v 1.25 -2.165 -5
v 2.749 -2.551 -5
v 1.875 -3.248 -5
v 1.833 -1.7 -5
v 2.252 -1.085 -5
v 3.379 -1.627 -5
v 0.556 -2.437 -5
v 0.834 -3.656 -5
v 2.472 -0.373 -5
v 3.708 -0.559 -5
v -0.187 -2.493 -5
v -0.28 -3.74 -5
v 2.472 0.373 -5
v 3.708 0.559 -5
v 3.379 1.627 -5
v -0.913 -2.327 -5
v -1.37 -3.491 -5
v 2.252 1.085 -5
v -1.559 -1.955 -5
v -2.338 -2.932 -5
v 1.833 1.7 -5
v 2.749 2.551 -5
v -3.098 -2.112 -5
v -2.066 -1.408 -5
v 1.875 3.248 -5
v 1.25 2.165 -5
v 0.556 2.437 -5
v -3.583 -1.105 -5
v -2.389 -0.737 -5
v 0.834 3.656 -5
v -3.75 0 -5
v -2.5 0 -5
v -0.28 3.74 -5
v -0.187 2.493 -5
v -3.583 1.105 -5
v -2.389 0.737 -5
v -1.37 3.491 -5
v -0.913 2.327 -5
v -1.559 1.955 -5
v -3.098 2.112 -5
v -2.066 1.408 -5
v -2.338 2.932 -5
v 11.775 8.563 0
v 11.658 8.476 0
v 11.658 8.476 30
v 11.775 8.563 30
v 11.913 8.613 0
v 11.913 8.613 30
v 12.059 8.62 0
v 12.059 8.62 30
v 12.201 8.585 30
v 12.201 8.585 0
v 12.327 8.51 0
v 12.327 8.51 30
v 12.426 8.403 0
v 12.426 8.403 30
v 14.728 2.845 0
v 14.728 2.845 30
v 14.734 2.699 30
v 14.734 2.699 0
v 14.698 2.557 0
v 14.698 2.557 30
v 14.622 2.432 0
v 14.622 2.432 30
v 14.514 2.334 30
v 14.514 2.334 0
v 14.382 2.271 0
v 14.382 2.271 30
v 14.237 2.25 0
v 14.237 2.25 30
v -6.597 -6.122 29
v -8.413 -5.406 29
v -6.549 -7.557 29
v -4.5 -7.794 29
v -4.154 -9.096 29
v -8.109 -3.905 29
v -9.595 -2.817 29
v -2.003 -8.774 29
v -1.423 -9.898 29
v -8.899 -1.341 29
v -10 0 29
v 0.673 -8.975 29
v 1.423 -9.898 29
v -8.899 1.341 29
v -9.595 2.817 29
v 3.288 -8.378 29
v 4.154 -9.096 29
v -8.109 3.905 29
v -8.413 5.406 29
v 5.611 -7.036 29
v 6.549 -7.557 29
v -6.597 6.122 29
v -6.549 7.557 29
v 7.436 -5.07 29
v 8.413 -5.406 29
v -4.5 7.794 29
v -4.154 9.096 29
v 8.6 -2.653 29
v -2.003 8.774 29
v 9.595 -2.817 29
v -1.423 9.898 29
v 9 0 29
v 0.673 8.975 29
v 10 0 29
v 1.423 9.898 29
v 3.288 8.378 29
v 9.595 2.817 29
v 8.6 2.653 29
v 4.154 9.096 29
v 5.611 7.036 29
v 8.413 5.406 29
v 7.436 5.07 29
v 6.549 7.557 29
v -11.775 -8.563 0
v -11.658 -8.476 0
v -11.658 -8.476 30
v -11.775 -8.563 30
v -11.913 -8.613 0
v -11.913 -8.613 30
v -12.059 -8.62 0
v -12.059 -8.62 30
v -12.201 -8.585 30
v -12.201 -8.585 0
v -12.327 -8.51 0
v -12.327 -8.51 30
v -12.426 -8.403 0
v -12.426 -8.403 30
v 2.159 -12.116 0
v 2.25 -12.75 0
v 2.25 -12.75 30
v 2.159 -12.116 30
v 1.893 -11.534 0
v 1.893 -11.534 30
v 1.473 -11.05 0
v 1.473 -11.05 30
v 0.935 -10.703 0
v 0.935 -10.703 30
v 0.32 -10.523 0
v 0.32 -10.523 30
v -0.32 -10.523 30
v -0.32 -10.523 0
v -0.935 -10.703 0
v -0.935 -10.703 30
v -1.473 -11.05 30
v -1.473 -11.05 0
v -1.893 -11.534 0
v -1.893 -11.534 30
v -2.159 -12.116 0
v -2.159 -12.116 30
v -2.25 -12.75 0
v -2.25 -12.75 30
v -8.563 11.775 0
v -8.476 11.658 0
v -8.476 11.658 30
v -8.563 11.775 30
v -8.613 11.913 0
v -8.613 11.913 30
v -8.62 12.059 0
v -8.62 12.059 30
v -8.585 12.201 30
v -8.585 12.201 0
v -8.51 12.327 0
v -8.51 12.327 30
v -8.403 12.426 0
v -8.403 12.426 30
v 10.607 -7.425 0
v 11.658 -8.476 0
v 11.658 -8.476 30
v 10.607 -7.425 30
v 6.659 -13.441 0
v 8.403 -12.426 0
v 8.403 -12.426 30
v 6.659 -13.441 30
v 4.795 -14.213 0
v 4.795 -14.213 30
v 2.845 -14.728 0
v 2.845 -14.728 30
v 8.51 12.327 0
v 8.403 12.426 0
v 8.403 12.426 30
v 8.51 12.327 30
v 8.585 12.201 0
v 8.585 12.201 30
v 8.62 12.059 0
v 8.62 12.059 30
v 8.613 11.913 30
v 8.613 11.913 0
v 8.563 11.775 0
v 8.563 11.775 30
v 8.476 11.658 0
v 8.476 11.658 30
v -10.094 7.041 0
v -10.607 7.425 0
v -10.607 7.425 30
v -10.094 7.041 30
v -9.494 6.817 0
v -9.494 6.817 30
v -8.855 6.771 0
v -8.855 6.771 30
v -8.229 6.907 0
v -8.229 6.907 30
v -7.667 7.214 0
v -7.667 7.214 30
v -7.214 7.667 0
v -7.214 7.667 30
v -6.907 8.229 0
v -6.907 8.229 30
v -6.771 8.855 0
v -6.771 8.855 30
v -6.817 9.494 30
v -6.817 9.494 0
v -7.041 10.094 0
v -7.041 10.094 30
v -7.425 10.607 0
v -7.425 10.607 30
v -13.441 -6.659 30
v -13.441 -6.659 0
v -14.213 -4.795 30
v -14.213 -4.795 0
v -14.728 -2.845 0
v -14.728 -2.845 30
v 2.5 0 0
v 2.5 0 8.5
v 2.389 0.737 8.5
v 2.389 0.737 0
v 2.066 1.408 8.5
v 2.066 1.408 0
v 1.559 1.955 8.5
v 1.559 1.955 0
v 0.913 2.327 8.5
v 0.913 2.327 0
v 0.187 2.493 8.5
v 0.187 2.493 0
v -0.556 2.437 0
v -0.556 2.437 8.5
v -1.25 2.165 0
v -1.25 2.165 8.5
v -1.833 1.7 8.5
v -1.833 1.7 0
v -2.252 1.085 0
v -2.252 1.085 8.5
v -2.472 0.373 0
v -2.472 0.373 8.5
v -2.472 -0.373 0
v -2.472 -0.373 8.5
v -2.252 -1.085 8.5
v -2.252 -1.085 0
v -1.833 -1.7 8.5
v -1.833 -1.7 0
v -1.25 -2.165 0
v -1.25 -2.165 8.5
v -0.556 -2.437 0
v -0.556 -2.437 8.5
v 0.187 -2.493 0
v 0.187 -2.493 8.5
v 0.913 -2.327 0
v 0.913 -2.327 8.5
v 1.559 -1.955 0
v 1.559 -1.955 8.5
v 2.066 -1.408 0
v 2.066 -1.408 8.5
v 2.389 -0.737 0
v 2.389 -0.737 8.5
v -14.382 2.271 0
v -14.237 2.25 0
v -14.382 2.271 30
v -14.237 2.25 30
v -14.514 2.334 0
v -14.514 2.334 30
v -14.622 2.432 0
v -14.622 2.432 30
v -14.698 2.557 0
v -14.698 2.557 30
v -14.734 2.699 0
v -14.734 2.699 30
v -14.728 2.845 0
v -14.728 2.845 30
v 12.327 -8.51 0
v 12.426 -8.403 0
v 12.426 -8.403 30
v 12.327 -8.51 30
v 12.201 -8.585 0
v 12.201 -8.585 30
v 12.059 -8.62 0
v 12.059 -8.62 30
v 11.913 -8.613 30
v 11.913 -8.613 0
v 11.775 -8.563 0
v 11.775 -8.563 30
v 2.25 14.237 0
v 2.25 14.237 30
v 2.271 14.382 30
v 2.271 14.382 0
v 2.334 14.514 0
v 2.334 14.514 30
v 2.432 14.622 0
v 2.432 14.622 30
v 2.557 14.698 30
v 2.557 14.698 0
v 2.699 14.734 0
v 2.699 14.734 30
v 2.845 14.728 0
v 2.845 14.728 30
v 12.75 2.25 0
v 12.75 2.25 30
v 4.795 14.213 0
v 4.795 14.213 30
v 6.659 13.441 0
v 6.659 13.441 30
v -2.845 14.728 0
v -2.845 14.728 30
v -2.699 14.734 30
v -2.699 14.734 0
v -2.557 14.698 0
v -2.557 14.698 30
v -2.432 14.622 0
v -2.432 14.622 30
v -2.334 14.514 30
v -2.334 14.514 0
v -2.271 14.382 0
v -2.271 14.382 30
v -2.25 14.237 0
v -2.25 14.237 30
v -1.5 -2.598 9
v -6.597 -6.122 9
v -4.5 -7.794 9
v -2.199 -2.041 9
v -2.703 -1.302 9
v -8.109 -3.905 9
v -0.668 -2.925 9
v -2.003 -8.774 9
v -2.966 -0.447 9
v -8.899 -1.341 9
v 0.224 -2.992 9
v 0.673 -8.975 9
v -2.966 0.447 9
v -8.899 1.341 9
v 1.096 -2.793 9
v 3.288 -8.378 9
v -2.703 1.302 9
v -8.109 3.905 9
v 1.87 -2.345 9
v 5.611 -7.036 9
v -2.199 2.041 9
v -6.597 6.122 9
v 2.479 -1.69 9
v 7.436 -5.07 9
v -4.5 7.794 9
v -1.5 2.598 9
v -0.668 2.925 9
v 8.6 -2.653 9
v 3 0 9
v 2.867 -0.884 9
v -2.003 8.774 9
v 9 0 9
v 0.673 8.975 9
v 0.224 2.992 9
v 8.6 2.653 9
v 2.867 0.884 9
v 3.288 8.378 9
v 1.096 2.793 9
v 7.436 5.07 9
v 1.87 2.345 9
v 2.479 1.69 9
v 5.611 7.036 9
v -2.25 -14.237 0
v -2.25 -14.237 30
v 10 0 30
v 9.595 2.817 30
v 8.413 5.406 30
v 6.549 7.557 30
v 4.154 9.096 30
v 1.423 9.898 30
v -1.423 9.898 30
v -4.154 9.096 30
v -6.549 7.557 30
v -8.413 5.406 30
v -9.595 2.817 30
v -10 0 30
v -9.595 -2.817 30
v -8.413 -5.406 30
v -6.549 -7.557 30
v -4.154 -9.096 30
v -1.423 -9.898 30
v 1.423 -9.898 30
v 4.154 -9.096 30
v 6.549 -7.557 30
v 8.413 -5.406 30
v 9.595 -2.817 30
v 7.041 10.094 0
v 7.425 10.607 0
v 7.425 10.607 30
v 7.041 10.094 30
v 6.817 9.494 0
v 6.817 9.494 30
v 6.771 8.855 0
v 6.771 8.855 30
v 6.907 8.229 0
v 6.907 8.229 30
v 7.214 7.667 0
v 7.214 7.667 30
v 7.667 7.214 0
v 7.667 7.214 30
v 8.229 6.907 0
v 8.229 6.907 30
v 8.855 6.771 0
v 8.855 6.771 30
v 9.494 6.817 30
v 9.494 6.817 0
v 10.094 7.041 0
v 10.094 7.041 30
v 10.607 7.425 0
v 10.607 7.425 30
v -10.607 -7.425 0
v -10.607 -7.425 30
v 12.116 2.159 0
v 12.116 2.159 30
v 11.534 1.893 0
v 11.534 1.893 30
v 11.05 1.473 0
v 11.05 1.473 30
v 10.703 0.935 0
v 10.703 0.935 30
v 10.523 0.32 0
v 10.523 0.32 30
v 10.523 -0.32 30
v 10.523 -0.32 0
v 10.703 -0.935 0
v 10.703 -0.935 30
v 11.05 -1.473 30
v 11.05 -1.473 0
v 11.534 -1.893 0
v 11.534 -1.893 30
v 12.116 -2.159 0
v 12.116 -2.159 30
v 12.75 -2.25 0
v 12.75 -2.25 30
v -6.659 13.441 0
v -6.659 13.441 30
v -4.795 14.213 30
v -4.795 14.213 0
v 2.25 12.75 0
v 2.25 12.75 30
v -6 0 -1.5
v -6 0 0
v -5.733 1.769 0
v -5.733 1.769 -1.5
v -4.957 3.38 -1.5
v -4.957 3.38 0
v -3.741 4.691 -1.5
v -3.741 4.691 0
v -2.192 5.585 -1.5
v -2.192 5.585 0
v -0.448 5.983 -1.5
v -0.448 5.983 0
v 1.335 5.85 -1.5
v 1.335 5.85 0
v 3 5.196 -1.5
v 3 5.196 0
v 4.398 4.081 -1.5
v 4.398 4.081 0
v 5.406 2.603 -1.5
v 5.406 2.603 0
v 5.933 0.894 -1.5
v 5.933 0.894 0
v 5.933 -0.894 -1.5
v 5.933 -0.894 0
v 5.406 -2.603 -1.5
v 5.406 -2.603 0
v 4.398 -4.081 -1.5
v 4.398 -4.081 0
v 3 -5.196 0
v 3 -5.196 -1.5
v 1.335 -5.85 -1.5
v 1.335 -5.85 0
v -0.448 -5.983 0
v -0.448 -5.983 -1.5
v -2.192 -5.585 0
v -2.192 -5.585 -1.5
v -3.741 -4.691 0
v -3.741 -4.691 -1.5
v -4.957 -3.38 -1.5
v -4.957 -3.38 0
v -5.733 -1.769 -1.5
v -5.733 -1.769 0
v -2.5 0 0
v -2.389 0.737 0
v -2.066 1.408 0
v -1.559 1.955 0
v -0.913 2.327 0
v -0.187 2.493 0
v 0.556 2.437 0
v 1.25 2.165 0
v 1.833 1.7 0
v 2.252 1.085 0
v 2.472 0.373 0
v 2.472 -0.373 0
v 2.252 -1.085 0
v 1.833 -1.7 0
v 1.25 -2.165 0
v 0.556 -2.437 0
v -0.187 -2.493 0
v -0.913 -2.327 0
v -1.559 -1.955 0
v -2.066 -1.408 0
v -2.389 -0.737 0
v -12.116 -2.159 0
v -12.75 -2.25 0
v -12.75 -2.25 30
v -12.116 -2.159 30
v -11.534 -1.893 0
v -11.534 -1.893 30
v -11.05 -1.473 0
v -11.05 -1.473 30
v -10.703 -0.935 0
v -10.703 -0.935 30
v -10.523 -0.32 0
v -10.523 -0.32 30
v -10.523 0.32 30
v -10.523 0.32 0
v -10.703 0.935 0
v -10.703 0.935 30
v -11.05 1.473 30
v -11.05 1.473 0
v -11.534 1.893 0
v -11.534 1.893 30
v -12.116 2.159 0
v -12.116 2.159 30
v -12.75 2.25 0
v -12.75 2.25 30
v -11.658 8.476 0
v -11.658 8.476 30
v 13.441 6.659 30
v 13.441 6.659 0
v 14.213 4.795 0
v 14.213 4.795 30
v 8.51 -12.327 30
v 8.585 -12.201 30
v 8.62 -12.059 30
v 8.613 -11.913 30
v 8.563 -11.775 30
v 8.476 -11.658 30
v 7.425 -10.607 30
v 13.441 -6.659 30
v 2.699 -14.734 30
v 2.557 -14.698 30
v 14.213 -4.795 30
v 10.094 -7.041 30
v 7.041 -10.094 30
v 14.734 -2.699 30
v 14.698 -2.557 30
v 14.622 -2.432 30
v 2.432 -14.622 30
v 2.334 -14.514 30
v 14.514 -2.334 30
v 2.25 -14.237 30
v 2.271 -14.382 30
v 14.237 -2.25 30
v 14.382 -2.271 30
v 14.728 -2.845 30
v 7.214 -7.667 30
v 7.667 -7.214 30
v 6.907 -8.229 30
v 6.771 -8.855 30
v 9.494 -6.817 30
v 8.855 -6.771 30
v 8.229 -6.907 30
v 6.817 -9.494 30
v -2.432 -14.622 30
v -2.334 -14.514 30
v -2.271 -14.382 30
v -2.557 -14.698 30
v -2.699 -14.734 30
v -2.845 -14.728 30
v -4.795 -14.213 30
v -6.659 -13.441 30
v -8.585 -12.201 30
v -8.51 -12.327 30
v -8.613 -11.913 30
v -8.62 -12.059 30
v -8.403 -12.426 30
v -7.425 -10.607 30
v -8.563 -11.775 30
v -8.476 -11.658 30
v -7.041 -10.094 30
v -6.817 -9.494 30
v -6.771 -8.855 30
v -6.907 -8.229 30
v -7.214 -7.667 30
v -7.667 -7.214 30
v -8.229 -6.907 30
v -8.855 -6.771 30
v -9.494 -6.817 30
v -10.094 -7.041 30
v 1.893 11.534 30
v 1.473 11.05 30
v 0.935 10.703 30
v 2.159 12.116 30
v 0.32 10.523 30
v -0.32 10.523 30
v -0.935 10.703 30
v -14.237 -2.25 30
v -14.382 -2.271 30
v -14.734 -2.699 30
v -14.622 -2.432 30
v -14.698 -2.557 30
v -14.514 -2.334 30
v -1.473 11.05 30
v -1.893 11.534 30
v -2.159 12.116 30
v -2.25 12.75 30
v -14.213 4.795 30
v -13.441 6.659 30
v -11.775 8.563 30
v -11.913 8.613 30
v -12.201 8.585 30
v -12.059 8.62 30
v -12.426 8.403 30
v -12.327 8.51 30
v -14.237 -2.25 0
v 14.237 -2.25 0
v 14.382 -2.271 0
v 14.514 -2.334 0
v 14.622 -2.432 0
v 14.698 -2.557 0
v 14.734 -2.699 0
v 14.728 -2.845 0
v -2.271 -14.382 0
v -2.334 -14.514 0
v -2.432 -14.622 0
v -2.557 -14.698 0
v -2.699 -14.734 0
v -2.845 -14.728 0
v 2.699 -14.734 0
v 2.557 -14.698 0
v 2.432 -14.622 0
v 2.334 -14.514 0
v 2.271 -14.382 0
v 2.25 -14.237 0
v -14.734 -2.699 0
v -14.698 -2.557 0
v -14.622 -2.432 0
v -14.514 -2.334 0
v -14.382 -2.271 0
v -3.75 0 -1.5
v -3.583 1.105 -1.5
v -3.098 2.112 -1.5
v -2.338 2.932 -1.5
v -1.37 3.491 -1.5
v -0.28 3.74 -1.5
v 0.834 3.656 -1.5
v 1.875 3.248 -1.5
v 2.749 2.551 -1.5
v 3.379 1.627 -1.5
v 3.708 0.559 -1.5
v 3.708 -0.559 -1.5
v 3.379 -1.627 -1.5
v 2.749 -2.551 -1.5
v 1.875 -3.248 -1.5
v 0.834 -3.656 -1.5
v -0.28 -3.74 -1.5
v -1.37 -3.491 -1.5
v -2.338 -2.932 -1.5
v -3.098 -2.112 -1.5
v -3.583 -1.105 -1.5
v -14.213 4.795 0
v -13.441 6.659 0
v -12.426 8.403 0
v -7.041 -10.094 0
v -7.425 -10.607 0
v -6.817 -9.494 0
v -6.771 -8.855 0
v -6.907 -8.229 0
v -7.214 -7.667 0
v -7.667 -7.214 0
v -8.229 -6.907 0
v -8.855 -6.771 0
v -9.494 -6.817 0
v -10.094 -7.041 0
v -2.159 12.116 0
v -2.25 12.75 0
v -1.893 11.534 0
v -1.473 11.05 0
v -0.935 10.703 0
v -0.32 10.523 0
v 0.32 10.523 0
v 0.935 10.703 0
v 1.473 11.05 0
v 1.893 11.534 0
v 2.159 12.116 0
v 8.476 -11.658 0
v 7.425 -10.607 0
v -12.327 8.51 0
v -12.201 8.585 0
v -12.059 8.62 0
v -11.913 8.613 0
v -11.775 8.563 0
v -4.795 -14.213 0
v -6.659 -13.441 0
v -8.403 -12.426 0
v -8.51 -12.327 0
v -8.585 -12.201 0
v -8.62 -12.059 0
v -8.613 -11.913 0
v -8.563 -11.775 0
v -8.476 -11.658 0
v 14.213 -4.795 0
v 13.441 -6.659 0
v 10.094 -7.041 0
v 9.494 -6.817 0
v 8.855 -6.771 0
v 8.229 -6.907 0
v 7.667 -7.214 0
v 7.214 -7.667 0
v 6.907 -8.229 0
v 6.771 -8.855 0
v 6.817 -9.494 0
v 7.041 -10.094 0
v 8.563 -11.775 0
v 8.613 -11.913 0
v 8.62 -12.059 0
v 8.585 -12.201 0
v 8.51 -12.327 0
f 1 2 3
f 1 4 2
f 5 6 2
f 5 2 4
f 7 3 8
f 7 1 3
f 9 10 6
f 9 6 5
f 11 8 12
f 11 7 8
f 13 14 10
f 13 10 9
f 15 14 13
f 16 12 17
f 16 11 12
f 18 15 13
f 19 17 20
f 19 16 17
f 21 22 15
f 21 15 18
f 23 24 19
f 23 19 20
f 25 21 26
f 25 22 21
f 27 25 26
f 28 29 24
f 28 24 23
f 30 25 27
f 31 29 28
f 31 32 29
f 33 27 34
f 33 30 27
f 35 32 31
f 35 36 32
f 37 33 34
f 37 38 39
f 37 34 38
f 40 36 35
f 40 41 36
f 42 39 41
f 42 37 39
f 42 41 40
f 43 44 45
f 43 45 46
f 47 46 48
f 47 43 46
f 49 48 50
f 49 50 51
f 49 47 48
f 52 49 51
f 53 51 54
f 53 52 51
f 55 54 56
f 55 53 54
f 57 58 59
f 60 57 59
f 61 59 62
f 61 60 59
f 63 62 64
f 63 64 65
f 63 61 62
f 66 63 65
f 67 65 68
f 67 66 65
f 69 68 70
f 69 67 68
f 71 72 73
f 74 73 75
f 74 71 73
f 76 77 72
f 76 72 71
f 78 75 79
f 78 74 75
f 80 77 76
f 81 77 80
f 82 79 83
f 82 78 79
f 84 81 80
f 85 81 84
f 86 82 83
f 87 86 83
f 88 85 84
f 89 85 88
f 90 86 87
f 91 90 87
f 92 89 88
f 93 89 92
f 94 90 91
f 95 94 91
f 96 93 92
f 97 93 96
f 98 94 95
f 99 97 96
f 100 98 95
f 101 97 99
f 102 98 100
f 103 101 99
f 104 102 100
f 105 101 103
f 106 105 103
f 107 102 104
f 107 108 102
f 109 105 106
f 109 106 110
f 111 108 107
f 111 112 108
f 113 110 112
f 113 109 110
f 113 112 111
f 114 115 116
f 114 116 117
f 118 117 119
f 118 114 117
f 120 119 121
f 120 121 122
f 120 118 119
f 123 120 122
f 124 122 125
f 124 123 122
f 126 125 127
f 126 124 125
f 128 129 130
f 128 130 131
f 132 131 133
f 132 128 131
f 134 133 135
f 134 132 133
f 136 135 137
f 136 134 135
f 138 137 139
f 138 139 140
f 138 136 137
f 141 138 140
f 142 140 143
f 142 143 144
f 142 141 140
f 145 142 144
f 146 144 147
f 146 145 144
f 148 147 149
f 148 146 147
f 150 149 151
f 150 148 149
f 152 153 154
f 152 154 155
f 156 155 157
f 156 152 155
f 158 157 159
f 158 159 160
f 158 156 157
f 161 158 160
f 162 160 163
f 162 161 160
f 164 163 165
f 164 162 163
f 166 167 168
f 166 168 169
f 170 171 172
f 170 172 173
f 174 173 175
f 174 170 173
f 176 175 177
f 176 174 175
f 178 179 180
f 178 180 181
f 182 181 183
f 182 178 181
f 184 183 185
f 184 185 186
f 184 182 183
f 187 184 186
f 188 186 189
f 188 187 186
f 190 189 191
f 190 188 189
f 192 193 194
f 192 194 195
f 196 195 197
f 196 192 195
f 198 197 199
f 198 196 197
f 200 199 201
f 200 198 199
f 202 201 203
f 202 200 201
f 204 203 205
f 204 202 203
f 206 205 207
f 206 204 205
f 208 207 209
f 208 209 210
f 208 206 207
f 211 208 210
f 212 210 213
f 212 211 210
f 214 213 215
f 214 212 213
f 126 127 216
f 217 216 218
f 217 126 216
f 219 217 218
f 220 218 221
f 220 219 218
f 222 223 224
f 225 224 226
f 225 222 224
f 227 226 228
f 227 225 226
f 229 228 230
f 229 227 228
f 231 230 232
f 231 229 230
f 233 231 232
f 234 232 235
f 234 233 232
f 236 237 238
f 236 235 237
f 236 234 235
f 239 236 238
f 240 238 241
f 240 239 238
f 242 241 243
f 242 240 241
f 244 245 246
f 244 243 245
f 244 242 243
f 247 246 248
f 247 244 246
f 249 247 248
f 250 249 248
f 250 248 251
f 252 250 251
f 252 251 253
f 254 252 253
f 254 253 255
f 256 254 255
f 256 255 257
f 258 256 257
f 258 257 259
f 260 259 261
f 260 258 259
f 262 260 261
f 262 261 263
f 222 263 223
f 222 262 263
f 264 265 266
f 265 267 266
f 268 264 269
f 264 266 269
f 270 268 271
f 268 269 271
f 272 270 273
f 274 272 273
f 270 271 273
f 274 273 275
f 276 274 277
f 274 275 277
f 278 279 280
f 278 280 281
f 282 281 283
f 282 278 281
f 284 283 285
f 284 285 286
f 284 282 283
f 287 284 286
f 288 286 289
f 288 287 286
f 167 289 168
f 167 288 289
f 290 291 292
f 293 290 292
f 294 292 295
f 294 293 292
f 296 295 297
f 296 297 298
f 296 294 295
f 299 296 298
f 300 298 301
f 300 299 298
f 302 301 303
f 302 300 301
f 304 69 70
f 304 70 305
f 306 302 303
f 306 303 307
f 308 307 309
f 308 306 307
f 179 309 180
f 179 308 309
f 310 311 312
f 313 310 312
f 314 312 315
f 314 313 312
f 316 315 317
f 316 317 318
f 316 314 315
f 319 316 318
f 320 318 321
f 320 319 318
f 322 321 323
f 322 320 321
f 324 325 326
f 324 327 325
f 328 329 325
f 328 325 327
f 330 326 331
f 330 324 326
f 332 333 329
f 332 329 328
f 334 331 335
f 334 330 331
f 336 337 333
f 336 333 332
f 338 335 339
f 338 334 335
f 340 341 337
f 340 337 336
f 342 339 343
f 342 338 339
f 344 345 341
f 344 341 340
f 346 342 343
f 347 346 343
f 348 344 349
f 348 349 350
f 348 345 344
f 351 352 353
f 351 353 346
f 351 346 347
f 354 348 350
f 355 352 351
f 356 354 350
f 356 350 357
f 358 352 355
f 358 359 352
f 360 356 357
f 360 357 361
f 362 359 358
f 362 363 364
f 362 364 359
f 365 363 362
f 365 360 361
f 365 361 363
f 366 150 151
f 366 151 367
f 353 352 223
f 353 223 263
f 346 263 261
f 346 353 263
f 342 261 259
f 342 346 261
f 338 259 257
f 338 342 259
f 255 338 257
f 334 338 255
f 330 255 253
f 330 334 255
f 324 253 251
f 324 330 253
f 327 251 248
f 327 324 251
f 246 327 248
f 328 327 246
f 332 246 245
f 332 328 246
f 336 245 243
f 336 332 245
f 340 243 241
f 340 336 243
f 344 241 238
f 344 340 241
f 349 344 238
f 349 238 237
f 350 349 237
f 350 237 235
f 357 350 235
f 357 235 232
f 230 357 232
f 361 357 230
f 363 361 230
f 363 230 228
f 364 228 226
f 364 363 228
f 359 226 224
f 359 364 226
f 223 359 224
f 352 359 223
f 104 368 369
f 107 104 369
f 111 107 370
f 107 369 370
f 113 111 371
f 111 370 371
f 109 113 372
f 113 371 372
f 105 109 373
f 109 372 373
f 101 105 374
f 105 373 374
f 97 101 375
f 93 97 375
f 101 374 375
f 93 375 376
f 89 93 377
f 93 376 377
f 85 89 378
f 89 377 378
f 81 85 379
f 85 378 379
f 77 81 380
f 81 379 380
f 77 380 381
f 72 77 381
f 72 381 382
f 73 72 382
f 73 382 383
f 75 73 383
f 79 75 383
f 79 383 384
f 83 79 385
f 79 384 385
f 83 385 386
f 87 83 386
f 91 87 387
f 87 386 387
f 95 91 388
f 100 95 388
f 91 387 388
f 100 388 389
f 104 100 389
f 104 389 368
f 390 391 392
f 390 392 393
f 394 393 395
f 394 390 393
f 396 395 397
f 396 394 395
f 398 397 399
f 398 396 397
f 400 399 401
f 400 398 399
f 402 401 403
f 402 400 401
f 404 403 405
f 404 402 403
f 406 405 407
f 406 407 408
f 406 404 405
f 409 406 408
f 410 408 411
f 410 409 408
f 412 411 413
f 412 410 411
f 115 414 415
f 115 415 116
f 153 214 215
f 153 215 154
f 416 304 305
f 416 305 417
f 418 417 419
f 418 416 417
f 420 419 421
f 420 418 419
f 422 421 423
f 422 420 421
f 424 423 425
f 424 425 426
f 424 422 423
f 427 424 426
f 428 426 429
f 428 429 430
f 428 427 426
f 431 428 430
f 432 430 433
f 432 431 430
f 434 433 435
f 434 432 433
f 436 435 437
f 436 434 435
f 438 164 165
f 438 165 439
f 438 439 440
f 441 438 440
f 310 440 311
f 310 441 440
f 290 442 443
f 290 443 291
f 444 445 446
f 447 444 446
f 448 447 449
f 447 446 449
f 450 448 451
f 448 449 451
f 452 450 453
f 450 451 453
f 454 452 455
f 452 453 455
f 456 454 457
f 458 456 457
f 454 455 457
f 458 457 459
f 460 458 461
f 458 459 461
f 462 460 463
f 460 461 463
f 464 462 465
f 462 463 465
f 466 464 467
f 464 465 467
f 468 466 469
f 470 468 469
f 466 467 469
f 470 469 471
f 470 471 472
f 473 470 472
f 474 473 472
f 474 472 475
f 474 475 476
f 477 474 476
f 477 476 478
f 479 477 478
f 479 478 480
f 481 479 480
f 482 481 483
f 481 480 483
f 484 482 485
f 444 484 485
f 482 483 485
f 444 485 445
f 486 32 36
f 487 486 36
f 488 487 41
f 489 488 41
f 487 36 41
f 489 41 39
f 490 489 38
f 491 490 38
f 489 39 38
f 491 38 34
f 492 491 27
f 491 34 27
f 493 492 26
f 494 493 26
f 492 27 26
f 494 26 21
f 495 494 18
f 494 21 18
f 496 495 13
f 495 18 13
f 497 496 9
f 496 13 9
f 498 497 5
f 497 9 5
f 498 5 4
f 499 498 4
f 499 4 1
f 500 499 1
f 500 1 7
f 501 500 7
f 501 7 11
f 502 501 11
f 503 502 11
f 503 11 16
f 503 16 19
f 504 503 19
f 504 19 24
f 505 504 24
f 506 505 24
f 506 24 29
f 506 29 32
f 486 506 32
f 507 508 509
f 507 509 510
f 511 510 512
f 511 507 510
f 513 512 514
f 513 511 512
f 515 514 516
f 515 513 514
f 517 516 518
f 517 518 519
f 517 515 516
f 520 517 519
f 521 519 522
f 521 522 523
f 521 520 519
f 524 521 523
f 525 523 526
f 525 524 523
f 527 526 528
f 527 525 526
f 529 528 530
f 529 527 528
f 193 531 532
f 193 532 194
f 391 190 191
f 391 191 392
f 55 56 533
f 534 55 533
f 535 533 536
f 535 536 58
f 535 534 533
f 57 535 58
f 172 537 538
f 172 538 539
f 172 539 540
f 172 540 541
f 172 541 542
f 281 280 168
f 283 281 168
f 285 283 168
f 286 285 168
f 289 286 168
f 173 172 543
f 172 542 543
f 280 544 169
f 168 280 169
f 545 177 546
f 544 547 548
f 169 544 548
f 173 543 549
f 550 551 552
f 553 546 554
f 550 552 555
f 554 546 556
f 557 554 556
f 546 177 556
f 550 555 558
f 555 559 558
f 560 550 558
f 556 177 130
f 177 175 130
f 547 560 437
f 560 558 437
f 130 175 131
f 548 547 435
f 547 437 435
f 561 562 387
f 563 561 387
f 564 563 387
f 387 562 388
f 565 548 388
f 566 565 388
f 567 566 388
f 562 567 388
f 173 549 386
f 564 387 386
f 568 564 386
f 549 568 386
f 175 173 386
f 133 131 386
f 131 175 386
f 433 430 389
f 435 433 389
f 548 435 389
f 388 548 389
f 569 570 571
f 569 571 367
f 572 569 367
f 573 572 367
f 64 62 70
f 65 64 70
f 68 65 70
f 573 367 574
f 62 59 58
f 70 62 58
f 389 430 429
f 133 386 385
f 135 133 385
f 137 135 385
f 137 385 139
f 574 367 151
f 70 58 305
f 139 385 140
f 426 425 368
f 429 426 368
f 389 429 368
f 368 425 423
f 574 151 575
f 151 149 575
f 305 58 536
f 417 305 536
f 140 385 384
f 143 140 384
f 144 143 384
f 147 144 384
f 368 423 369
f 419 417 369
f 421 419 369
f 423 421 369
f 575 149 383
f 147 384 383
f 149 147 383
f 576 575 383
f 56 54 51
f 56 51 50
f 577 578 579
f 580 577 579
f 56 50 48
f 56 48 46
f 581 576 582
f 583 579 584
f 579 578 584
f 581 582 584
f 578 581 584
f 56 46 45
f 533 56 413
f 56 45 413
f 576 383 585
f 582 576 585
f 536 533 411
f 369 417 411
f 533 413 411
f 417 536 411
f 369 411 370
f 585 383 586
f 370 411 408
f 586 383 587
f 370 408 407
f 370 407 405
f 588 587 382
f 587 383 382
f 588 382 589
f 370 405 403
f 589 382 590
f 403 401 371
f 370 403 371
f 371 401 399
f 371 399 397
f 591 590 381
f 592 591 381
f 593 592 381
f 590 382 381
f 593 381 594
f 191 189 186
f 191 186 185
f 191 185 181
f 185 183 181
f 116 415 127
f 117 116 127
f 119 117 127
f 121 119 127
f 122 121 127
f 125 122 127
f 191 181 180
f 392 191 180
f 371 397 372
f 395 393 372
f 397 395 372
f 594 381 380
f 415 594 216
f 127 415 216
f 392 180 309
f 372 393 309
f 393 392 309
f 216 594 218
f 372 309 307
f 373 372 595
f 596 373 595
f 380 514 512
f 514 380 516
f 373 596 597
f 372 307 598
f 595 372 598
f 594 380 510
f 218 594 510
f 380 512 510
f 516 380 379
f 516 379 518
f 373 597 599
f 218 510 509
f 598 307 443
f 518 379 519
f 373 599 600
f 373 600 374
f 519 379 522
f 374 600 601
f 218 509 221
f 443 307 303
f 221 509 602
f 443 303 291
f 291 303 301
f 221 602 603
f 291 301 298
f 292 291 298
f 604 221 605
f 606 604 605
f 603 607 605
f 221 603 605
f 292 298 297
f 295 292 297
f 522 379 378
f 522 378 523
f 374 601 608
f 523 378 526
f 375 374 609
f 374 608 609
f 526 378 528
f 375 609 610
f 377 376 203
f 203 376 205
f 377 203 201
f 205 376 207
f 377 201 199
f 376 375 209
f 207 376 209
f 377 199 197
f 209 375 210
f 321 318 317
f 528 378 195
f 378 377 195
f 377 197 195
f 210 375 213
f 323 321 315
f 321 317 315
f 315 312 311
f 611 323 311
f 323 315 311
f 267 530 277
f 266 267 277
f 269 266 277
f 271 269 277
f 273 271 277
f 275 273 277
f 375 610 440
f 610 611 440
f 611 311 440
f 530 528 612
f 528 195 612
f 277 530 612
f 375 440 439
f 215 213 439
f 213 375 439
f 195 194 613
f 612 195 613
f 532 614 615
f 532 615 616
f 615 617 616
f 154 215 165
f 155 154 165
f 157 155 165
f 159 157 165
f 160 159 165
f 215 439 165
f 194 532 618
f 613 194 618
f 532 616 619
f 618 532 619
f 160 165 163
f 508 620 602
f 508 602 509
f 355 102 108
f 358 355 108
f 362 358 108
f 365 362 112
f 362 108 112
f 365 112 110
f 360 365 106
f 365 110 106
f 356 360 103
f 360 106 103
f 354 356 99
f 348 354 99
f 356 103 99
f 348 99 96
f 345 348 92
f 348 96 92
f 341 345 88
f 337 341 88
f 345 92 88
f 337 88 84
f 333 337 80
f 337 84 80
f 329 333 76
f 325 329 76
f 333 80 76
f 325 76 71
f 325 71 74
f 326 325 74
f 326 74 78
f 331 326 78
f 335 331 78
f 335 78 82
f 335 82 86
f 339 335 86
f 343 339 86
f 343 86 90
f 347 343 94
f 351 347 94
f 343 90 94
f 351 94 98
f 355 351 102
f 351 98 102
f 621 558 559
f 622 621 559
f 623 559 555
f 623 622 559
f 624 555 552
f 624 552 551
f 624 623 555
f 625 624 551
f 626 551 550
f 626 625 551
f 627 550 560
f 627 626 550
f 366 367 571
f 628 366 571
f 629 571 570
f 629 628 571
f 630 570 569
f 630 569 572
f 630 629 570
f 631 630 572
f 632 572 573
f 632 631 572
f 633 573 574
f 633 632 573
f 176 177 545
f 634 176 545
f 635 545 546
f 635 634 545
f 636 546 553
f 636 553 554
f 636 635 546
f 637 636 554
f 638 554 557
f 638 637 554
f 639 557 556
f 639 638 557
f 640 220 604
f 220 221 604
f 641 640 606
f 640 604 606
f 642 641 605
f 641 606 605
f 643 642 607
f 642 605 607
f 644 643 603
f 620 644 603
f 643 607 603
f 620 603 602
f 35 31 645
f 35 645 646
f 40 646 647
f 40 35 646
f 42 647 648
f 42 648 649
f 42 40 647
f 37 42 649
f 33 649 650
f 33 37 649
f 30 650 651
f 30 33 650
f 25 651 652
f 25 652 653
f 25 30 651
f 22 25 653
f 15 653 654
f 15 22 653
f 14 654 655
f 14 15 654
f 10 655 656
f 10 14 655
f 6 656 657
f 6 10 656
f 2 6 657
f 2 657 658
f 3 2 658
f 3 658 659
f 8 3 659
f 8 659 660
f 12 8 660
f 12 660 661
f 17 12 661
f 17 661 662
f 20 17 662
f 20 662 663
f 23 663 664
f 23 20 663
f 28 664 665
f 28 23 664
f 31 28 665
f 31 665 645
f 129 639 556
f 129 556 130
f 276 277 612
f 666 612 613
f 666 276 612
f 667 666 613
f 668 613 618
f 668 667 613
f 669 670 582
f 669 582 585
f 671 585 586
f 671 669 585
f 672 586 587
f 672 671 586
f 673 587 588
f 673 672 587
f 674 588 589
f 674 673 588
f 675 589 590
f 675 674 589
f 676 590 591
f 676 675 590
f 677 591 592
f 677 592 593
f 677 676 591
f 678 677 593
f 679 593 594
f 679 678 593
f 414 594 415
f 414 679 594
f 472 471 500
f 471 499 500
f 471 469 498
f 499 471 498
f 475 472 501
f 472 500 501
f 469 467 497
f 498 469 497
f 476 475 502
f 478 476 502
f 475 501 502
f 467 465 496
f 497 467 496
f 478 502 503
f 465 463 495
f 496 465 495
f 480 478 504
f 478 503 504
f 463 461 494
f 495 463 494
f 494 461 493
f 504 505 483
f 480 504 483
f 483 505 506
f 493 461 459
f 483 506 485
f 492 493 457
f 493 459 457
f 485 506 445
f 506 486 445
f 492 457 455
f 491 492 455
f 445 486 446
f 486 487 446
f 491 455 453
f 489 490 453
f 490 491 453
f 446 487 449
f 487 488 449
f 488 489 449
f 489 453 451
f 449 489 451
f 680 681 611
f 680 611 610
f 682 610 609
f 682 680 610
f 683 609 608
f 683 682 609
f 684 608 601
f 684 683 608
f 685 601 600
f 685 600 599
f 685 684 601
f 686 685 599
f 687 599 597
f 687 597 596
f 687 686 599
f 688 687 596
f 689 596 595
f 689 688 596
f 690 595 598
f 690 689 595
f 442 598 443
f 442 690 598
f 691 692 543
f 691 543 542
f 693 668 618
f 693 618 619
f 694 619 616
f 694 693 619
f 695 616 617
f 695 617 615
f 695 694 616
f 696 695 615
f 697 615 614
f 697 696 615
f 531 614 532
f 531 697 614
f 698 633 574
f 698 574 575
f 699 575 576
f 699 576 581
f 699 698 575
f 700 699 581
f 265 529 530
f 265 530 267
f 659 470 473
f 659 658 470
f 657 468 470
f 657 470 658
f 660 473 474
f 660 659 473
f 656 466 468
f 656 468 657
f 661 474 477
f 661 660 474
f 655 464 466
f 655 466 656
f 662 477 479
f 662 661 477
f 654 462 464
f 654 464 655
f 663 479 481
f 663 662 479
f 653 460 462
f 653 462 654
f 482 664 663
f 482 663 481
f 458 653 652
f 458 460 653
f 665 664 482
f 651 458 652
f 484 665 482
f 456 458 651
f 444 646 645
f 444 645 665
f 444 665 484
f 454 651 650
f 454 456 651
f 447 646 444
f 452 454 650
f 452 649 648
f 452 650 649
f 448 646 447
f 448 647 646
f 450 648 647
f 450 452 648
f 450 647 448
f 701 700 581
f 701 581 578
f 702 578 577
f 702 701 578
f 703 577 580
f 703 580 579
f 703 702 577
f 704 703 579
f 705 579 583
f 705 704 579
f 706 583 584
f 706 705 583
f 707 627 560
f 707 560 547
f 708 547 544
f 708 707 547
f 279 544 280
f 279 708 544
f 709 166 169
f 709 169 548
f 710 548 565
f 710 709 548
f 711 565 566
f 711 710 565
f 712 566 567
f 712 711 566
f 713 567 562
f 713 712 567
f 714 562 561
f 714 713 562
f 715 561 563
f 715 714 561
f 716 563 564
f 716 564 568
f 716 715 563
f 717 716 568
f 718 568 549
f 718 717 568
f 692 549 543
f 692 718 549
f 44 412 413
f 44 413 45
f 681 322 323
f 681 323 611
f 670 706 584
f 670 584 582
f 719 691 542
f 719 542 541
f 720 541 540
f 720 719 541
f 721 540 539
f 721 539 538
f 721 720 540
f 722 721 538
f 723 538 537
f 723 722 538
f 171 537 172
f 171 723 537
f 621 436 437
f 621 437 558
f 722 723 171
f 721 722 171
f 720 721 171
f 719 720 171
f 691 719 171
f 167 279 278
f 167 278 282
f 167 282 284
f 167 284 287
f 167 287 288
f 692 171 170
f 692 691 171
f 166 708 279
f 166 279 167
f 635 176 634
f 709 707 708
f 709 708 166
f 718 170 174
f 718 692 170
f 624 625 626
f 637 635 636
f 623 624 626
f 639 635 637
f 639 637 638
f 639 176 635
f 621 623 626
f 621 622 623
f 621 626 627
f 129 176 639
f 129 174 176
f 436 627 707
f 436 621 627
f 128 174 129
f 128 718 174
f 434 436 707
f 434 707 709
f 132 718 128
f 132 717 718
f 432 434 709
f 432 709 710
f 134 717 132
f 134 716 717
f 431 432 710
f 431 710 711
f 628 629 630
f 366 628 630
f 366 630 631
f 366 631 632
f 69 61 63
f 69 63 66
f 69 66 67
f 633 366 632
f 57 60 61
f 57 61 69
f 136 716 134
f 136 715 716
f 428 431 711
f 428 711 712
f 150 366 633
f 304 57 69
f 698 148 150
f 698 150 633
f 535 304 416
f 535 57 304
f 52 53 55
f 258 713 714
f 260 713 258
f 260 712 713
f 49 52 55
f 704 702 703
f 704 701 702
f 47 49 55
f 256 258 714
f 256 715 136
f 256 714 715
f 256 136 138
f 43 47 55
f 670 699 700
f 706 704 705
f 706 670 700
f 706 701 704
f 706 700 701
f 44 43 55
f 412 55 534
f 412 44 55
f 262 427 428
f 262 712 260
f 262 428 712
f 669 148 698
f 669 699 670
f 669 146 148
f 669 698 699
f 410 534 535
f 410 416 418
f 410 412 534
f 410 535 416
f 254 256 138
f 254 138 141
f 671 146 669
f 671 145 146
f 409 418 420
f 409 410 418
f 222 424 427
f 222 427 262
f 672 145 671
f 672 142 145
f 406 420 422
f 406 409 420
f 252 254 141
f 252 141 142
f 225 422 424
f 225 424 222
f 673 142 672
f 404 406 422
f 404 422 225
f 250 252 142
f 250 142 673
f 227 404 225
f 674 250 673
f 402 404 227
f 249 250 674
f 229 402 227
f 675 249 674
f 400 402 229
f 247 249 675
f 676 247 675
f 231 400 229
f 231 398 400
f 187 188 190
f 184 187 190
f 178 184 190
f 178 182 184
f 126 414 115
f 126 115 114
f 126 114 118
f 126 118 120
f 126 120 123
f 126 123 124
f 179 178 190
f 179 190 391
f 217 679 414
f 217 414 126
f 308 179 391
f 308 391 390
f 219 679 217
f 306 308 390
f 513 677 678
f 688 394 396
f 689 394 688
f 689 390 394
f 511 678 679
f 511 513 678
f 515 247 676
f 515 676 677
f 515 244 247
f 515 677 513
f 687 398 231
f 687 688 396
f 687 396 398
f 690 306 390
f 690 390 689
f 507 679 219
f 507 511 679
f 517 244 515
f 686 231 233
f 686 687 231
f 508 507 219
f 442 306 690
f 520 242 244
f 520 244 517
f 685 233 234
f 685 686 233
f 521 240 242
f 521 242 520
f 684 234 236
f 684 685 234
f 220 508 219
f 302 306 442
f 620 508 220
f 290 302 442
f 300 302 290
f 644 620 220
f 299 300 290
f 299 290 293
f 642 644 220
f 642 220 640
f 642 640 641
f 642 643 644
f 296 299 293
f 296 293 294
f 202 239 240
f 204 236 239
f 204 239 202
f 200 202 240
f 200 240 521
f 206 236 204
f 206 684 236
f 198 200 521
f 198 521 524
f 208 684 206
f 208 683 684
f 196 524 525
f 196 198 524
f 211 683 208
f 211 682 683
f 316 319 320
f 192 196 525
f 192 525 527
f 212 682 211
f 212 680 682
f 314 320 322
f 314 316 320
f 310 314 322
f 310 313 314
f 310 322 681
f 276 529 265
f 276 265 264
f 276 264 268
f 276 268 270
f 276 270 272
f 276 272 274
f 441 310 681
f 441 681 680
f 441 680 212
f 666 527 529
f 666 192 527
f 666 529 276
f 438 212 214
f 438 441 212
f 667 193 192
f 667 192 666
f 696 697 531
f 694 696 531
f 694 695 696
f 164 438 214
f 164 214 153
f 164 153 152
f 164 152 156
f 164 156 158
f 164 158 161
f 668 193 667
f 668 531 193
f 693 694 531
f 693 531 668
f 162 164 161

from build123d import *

# Parameters (mm, degrees)
SKETCH_1_R               = 2.5
EXTRUDE_1_DEPTH          = 30
FILLET_1_R               = 0.5
SKETCH_3_R               = 10
CUT_EXTRUDE_1_DEPTH      = 1
SKETCH_4_R               = 9
CUT_EXTRUDE_2_DEPTH      = 20
CHAMFER_1_SIZE           = 0.5
PATTERN_CIRCULAR_3_DEPTH = 30
SKETCH_9_R               = 6
SKETCH_9_R_2             = 2.5
EXTRUDE_3_DEPTH          = 1.5
EXTRUDE_START            = 3.5
SKETCH_10_R              = 3.75
SKETCH_10_R_2            = 2.5
EXTRUDE_4_DEPTH          = 3.5


# Read off the part's stored shape, not the designer's step: 阵列(圆周)3
with BuildPart() as part:
    # 草图1 → 凸台-拉伸1 (new body)
    with BuildSketch(Plane.XY):
        with BuildLine():
            Line((-12.75, 2.25), (-14.83028995, 2.25))
            ThreePointArc((-14.83028995, 2.25), (15, 0), (-14.83028995, -2.25))
            Line((-14.83028995, -2.25), (-12.75, -2.25))
            ThreePointArc((-12.75, -2.25), (-10.5, 0), (-12.75, 2.25))
        make_face()
        Circle(SKETCH_1_R, mode=Mode.SUBTRACT)
    extrude(amount=EXTRUDE_1_DEPTH)

    # 圆角1
    fillet_1_edges = [part.edges().sort_by_distance(p)[0] for p in [
        (-14.83028995, 2.25, 15),
        (-14.83028995, -2.25, 15),
    ]]
    fillet(fillet_1_edges, radius=FILLET_1_R)

    # 草图3 → 切除-拉伸1 (cut)
    with BuildSketch(Plane.XY.offset(30)):
        Circle(SKETCH_3_R)
    extrude(amount=-CUT_EXTRUDE_1_DEPTH, mode=Mode.SUBTRACT)

    # 草图4 → 切除-拉伸2 (cut)
    with BuildSketch(Plane.XY.offset(29)):
        Circle(SKETCH_4_R)
    extrude(amount=-CUT_EXTRUDE_2_DEPTH, mode=Mode.SUBTRACT)

    # 倒角1
    chamfer_1_edges = [part.edges().sort_by_distance(p)[0] for p in [
        (-2.5, 0, 9),
    ]]
    chamfer(chamfer_1_edges, length=CHAMFER_1_SIZE)

    # 阵列(圆周)3 outline → 阵列(圆周)3 (cut)
    with BuildSketch(Plane.XY):
        with BuildLine():
            ThreePointArc((-12.425696839, -8.402503084), (-10.606601718, -10.606601718), (-8.402503084, -12.425696839))
            ThreePointArc((-8.402503084, -12.425696839), (-8.620145822, -12.059137344), (-8.475973038, -11.657953554))
            Line((-8.475973038, -11.657953554), (-7.424621202, -10.606601718))
            ThreePointArc((-7.424621202, -10.606601718), (-7.424621202, -7.424621202), (-10.606601718, -7.424621202))
            Line((-10.606601718, -7.424621202), (-11.657953554, -8.475973038))
            ThreePointArc((-11.657953554, -8.475973038), (-12.059137344, -8.620145822), (-12.425696839, -8.402503084))
        make_face()
        with BuildLine():
            ThreePointArc((-8.475973038, 11.657953554), (-8.620145822, 12.059137344), (-8.402503084, 12.425696839))
            ThreePointArc((-8.402503084, 12.425696839), (-10.606601718, 10.606601718), (-12.425696839, 8.402503084))
            ThreePointArc((-12.425696839, 8.402503084), (-12.059137344, 8.620145822), (-11.657953554, 8.475973038))
            Line((-11.657953554, 8.475973038), (-10.606601718, 7.424621202))
            ThreePointArc((-10.606601718, 7.424621202), (-7.424621202, 7.424621202), (-7.424621202, 10.606601718))
            Line((-7.424621202, 10.606601718), (-8.475973038, 11.657953554))
        make_face()
        with BuildLine():
            ThreePointArc((2.25, 14.236836025), (2.431734225, 14.622461357), (2.844827586, 14.727761405))
            ThreePointArc((2.844827586, 14.727761405), (0, 15), (-2.844827586, 14.727761405))
            ThreePointArc((-2.844827586, 14.727761405), (-2.431734225, 14.622461357), (-2.25, 14.236836025))
            Line((-2.25, 14.236836025), (-2.25, 12.75))
            ThreePointArc((-2.25, 12.75), (0, 10.5), (2.25, 12.75))
            Line((2.25, 12.75), (2.25, 14.236836025))
        make_face()
        with BuildLine():
            ThreePointArc((11.657953554, 8.475973038), (12.059137344, 8.620145822), (12.425696839, 8.402503084))
            ThreePointArc((12.425696839, 8.402503084), (10.606601718, 10.606601718), (8.402503084, 12.425696839))
            ThreePointArc((8.402503084, 12.425696839), (8.620145822, 12.059137344), (8.475973038, 11.657953554))
            Line((8.475973038, 11.657953554), (7.424621202, 10.606601718))
            ThreePointArc((7.424621202, 10.606601718), (7.424621202, 7.424621202), (10.606601718, 7.424621202))
            Line((10.606601718, 7.424621202), (11.657953554, 8.475973038))
        make_face()
        with BuildLine():
            ThreePointArc((14.236836025, -2.25), (14.622461357, -2.431734225), (14.727761405, -2.844827586))
            ThreePointArc((14.727761405, -2.844827586), (15, 0), (14.727761405, 2.844827586))
            ThreePointArc((14.727761405, 2.844827586), (14.622461357, 2.431734225), (14.236836025, 2.25))
            Line((14.236836025, 2.25), (12.75, 2.25))
            ThreePointArc((12.75, 2.25), (10.5, 0), (12.75, -2.25))
            Line((12.75, -2.25), (14.236836025, -2.25))
        make_face()
        with BuildLine():
            ThreePointArc((8.475973038, -11.657953554), (8.620145822, -12.059137344), (8.402503084, -12.425696839))
            ThreePointArc((8.402503084, -12.425696839), (10.606601718, -10.606601718), (12.425696839, -8.402503084))
            ThreePointArc((12.425696839, -8.402503084), (12.059137344, -8.620145822), (11.657953554, -8.475973038))
            Line((11.657953554, -8.475973038), (10.606601718, -7.424621202))
            ThreePointArc((10.606601718, -7.424621202), (7.424621202, -7.424621202), (7.424621202, -10.606601718))
            Line((7.424621202, -10.606601718), (8.475973038, -11.657953554))
        make_face()
        with BuildLine():
            ThreePointArc((-2.25, -14.236836025), (-2.431734225, -14.622461357), (-2.844827586, -14.727761405))
            ThreePointArc((-2.844827586, -14.727761405), (0, -15), (2.844827586, -14.727761405))
            ThreePointArc((2.844827586, -14.727761405), (2.431734225, -14.622461357), (2.25, -14.236836025))
            Line((2.25, -14.236836025), (2.25, -12.75))
            ThreePointArc((2.25, -12.75), (0, -10.5), (-2.25, -12.75))
            Line((-2.25, -12.75), (-2.25, -14.236836025))
        make_face()
    extrude(amount=PATTERN_CIRCULAR_3_DEPTH, mode=Mode.SUBTRACT)


with BuildPart() as body_2:
    # 草图9 → 凸台-拉伸3 (new body)
    with BuildSketch(Plane(origin=(0, 0, 0), x_dir=(-1, 0, 0), z_dir=(0, 0, -1))):
        Circle(SKETCH_9_R)
        Circle(SKETCH_9_R_2, mode=Mode.SUBTRACT)
    extrude(amount=EXTRUDE_3_DEPTH)

    # 草图10 → 凸台-拉伸4 (add)
    with BuildSketch(Plane(origin=(0, 0, -1.5), x_dir=(-1, 0, 0), z_dir=(0, 0, -1)).offset(EXTRUDE_START)):
        Circle(SKETCH_10_R)
        Circle(SKETCH_10_R_2, mode=Mode.SUBTRACT)
    extrude(amount=-EXTRUDE_4_DEPTH)


solid = Compound([part.part, body_2.part])
